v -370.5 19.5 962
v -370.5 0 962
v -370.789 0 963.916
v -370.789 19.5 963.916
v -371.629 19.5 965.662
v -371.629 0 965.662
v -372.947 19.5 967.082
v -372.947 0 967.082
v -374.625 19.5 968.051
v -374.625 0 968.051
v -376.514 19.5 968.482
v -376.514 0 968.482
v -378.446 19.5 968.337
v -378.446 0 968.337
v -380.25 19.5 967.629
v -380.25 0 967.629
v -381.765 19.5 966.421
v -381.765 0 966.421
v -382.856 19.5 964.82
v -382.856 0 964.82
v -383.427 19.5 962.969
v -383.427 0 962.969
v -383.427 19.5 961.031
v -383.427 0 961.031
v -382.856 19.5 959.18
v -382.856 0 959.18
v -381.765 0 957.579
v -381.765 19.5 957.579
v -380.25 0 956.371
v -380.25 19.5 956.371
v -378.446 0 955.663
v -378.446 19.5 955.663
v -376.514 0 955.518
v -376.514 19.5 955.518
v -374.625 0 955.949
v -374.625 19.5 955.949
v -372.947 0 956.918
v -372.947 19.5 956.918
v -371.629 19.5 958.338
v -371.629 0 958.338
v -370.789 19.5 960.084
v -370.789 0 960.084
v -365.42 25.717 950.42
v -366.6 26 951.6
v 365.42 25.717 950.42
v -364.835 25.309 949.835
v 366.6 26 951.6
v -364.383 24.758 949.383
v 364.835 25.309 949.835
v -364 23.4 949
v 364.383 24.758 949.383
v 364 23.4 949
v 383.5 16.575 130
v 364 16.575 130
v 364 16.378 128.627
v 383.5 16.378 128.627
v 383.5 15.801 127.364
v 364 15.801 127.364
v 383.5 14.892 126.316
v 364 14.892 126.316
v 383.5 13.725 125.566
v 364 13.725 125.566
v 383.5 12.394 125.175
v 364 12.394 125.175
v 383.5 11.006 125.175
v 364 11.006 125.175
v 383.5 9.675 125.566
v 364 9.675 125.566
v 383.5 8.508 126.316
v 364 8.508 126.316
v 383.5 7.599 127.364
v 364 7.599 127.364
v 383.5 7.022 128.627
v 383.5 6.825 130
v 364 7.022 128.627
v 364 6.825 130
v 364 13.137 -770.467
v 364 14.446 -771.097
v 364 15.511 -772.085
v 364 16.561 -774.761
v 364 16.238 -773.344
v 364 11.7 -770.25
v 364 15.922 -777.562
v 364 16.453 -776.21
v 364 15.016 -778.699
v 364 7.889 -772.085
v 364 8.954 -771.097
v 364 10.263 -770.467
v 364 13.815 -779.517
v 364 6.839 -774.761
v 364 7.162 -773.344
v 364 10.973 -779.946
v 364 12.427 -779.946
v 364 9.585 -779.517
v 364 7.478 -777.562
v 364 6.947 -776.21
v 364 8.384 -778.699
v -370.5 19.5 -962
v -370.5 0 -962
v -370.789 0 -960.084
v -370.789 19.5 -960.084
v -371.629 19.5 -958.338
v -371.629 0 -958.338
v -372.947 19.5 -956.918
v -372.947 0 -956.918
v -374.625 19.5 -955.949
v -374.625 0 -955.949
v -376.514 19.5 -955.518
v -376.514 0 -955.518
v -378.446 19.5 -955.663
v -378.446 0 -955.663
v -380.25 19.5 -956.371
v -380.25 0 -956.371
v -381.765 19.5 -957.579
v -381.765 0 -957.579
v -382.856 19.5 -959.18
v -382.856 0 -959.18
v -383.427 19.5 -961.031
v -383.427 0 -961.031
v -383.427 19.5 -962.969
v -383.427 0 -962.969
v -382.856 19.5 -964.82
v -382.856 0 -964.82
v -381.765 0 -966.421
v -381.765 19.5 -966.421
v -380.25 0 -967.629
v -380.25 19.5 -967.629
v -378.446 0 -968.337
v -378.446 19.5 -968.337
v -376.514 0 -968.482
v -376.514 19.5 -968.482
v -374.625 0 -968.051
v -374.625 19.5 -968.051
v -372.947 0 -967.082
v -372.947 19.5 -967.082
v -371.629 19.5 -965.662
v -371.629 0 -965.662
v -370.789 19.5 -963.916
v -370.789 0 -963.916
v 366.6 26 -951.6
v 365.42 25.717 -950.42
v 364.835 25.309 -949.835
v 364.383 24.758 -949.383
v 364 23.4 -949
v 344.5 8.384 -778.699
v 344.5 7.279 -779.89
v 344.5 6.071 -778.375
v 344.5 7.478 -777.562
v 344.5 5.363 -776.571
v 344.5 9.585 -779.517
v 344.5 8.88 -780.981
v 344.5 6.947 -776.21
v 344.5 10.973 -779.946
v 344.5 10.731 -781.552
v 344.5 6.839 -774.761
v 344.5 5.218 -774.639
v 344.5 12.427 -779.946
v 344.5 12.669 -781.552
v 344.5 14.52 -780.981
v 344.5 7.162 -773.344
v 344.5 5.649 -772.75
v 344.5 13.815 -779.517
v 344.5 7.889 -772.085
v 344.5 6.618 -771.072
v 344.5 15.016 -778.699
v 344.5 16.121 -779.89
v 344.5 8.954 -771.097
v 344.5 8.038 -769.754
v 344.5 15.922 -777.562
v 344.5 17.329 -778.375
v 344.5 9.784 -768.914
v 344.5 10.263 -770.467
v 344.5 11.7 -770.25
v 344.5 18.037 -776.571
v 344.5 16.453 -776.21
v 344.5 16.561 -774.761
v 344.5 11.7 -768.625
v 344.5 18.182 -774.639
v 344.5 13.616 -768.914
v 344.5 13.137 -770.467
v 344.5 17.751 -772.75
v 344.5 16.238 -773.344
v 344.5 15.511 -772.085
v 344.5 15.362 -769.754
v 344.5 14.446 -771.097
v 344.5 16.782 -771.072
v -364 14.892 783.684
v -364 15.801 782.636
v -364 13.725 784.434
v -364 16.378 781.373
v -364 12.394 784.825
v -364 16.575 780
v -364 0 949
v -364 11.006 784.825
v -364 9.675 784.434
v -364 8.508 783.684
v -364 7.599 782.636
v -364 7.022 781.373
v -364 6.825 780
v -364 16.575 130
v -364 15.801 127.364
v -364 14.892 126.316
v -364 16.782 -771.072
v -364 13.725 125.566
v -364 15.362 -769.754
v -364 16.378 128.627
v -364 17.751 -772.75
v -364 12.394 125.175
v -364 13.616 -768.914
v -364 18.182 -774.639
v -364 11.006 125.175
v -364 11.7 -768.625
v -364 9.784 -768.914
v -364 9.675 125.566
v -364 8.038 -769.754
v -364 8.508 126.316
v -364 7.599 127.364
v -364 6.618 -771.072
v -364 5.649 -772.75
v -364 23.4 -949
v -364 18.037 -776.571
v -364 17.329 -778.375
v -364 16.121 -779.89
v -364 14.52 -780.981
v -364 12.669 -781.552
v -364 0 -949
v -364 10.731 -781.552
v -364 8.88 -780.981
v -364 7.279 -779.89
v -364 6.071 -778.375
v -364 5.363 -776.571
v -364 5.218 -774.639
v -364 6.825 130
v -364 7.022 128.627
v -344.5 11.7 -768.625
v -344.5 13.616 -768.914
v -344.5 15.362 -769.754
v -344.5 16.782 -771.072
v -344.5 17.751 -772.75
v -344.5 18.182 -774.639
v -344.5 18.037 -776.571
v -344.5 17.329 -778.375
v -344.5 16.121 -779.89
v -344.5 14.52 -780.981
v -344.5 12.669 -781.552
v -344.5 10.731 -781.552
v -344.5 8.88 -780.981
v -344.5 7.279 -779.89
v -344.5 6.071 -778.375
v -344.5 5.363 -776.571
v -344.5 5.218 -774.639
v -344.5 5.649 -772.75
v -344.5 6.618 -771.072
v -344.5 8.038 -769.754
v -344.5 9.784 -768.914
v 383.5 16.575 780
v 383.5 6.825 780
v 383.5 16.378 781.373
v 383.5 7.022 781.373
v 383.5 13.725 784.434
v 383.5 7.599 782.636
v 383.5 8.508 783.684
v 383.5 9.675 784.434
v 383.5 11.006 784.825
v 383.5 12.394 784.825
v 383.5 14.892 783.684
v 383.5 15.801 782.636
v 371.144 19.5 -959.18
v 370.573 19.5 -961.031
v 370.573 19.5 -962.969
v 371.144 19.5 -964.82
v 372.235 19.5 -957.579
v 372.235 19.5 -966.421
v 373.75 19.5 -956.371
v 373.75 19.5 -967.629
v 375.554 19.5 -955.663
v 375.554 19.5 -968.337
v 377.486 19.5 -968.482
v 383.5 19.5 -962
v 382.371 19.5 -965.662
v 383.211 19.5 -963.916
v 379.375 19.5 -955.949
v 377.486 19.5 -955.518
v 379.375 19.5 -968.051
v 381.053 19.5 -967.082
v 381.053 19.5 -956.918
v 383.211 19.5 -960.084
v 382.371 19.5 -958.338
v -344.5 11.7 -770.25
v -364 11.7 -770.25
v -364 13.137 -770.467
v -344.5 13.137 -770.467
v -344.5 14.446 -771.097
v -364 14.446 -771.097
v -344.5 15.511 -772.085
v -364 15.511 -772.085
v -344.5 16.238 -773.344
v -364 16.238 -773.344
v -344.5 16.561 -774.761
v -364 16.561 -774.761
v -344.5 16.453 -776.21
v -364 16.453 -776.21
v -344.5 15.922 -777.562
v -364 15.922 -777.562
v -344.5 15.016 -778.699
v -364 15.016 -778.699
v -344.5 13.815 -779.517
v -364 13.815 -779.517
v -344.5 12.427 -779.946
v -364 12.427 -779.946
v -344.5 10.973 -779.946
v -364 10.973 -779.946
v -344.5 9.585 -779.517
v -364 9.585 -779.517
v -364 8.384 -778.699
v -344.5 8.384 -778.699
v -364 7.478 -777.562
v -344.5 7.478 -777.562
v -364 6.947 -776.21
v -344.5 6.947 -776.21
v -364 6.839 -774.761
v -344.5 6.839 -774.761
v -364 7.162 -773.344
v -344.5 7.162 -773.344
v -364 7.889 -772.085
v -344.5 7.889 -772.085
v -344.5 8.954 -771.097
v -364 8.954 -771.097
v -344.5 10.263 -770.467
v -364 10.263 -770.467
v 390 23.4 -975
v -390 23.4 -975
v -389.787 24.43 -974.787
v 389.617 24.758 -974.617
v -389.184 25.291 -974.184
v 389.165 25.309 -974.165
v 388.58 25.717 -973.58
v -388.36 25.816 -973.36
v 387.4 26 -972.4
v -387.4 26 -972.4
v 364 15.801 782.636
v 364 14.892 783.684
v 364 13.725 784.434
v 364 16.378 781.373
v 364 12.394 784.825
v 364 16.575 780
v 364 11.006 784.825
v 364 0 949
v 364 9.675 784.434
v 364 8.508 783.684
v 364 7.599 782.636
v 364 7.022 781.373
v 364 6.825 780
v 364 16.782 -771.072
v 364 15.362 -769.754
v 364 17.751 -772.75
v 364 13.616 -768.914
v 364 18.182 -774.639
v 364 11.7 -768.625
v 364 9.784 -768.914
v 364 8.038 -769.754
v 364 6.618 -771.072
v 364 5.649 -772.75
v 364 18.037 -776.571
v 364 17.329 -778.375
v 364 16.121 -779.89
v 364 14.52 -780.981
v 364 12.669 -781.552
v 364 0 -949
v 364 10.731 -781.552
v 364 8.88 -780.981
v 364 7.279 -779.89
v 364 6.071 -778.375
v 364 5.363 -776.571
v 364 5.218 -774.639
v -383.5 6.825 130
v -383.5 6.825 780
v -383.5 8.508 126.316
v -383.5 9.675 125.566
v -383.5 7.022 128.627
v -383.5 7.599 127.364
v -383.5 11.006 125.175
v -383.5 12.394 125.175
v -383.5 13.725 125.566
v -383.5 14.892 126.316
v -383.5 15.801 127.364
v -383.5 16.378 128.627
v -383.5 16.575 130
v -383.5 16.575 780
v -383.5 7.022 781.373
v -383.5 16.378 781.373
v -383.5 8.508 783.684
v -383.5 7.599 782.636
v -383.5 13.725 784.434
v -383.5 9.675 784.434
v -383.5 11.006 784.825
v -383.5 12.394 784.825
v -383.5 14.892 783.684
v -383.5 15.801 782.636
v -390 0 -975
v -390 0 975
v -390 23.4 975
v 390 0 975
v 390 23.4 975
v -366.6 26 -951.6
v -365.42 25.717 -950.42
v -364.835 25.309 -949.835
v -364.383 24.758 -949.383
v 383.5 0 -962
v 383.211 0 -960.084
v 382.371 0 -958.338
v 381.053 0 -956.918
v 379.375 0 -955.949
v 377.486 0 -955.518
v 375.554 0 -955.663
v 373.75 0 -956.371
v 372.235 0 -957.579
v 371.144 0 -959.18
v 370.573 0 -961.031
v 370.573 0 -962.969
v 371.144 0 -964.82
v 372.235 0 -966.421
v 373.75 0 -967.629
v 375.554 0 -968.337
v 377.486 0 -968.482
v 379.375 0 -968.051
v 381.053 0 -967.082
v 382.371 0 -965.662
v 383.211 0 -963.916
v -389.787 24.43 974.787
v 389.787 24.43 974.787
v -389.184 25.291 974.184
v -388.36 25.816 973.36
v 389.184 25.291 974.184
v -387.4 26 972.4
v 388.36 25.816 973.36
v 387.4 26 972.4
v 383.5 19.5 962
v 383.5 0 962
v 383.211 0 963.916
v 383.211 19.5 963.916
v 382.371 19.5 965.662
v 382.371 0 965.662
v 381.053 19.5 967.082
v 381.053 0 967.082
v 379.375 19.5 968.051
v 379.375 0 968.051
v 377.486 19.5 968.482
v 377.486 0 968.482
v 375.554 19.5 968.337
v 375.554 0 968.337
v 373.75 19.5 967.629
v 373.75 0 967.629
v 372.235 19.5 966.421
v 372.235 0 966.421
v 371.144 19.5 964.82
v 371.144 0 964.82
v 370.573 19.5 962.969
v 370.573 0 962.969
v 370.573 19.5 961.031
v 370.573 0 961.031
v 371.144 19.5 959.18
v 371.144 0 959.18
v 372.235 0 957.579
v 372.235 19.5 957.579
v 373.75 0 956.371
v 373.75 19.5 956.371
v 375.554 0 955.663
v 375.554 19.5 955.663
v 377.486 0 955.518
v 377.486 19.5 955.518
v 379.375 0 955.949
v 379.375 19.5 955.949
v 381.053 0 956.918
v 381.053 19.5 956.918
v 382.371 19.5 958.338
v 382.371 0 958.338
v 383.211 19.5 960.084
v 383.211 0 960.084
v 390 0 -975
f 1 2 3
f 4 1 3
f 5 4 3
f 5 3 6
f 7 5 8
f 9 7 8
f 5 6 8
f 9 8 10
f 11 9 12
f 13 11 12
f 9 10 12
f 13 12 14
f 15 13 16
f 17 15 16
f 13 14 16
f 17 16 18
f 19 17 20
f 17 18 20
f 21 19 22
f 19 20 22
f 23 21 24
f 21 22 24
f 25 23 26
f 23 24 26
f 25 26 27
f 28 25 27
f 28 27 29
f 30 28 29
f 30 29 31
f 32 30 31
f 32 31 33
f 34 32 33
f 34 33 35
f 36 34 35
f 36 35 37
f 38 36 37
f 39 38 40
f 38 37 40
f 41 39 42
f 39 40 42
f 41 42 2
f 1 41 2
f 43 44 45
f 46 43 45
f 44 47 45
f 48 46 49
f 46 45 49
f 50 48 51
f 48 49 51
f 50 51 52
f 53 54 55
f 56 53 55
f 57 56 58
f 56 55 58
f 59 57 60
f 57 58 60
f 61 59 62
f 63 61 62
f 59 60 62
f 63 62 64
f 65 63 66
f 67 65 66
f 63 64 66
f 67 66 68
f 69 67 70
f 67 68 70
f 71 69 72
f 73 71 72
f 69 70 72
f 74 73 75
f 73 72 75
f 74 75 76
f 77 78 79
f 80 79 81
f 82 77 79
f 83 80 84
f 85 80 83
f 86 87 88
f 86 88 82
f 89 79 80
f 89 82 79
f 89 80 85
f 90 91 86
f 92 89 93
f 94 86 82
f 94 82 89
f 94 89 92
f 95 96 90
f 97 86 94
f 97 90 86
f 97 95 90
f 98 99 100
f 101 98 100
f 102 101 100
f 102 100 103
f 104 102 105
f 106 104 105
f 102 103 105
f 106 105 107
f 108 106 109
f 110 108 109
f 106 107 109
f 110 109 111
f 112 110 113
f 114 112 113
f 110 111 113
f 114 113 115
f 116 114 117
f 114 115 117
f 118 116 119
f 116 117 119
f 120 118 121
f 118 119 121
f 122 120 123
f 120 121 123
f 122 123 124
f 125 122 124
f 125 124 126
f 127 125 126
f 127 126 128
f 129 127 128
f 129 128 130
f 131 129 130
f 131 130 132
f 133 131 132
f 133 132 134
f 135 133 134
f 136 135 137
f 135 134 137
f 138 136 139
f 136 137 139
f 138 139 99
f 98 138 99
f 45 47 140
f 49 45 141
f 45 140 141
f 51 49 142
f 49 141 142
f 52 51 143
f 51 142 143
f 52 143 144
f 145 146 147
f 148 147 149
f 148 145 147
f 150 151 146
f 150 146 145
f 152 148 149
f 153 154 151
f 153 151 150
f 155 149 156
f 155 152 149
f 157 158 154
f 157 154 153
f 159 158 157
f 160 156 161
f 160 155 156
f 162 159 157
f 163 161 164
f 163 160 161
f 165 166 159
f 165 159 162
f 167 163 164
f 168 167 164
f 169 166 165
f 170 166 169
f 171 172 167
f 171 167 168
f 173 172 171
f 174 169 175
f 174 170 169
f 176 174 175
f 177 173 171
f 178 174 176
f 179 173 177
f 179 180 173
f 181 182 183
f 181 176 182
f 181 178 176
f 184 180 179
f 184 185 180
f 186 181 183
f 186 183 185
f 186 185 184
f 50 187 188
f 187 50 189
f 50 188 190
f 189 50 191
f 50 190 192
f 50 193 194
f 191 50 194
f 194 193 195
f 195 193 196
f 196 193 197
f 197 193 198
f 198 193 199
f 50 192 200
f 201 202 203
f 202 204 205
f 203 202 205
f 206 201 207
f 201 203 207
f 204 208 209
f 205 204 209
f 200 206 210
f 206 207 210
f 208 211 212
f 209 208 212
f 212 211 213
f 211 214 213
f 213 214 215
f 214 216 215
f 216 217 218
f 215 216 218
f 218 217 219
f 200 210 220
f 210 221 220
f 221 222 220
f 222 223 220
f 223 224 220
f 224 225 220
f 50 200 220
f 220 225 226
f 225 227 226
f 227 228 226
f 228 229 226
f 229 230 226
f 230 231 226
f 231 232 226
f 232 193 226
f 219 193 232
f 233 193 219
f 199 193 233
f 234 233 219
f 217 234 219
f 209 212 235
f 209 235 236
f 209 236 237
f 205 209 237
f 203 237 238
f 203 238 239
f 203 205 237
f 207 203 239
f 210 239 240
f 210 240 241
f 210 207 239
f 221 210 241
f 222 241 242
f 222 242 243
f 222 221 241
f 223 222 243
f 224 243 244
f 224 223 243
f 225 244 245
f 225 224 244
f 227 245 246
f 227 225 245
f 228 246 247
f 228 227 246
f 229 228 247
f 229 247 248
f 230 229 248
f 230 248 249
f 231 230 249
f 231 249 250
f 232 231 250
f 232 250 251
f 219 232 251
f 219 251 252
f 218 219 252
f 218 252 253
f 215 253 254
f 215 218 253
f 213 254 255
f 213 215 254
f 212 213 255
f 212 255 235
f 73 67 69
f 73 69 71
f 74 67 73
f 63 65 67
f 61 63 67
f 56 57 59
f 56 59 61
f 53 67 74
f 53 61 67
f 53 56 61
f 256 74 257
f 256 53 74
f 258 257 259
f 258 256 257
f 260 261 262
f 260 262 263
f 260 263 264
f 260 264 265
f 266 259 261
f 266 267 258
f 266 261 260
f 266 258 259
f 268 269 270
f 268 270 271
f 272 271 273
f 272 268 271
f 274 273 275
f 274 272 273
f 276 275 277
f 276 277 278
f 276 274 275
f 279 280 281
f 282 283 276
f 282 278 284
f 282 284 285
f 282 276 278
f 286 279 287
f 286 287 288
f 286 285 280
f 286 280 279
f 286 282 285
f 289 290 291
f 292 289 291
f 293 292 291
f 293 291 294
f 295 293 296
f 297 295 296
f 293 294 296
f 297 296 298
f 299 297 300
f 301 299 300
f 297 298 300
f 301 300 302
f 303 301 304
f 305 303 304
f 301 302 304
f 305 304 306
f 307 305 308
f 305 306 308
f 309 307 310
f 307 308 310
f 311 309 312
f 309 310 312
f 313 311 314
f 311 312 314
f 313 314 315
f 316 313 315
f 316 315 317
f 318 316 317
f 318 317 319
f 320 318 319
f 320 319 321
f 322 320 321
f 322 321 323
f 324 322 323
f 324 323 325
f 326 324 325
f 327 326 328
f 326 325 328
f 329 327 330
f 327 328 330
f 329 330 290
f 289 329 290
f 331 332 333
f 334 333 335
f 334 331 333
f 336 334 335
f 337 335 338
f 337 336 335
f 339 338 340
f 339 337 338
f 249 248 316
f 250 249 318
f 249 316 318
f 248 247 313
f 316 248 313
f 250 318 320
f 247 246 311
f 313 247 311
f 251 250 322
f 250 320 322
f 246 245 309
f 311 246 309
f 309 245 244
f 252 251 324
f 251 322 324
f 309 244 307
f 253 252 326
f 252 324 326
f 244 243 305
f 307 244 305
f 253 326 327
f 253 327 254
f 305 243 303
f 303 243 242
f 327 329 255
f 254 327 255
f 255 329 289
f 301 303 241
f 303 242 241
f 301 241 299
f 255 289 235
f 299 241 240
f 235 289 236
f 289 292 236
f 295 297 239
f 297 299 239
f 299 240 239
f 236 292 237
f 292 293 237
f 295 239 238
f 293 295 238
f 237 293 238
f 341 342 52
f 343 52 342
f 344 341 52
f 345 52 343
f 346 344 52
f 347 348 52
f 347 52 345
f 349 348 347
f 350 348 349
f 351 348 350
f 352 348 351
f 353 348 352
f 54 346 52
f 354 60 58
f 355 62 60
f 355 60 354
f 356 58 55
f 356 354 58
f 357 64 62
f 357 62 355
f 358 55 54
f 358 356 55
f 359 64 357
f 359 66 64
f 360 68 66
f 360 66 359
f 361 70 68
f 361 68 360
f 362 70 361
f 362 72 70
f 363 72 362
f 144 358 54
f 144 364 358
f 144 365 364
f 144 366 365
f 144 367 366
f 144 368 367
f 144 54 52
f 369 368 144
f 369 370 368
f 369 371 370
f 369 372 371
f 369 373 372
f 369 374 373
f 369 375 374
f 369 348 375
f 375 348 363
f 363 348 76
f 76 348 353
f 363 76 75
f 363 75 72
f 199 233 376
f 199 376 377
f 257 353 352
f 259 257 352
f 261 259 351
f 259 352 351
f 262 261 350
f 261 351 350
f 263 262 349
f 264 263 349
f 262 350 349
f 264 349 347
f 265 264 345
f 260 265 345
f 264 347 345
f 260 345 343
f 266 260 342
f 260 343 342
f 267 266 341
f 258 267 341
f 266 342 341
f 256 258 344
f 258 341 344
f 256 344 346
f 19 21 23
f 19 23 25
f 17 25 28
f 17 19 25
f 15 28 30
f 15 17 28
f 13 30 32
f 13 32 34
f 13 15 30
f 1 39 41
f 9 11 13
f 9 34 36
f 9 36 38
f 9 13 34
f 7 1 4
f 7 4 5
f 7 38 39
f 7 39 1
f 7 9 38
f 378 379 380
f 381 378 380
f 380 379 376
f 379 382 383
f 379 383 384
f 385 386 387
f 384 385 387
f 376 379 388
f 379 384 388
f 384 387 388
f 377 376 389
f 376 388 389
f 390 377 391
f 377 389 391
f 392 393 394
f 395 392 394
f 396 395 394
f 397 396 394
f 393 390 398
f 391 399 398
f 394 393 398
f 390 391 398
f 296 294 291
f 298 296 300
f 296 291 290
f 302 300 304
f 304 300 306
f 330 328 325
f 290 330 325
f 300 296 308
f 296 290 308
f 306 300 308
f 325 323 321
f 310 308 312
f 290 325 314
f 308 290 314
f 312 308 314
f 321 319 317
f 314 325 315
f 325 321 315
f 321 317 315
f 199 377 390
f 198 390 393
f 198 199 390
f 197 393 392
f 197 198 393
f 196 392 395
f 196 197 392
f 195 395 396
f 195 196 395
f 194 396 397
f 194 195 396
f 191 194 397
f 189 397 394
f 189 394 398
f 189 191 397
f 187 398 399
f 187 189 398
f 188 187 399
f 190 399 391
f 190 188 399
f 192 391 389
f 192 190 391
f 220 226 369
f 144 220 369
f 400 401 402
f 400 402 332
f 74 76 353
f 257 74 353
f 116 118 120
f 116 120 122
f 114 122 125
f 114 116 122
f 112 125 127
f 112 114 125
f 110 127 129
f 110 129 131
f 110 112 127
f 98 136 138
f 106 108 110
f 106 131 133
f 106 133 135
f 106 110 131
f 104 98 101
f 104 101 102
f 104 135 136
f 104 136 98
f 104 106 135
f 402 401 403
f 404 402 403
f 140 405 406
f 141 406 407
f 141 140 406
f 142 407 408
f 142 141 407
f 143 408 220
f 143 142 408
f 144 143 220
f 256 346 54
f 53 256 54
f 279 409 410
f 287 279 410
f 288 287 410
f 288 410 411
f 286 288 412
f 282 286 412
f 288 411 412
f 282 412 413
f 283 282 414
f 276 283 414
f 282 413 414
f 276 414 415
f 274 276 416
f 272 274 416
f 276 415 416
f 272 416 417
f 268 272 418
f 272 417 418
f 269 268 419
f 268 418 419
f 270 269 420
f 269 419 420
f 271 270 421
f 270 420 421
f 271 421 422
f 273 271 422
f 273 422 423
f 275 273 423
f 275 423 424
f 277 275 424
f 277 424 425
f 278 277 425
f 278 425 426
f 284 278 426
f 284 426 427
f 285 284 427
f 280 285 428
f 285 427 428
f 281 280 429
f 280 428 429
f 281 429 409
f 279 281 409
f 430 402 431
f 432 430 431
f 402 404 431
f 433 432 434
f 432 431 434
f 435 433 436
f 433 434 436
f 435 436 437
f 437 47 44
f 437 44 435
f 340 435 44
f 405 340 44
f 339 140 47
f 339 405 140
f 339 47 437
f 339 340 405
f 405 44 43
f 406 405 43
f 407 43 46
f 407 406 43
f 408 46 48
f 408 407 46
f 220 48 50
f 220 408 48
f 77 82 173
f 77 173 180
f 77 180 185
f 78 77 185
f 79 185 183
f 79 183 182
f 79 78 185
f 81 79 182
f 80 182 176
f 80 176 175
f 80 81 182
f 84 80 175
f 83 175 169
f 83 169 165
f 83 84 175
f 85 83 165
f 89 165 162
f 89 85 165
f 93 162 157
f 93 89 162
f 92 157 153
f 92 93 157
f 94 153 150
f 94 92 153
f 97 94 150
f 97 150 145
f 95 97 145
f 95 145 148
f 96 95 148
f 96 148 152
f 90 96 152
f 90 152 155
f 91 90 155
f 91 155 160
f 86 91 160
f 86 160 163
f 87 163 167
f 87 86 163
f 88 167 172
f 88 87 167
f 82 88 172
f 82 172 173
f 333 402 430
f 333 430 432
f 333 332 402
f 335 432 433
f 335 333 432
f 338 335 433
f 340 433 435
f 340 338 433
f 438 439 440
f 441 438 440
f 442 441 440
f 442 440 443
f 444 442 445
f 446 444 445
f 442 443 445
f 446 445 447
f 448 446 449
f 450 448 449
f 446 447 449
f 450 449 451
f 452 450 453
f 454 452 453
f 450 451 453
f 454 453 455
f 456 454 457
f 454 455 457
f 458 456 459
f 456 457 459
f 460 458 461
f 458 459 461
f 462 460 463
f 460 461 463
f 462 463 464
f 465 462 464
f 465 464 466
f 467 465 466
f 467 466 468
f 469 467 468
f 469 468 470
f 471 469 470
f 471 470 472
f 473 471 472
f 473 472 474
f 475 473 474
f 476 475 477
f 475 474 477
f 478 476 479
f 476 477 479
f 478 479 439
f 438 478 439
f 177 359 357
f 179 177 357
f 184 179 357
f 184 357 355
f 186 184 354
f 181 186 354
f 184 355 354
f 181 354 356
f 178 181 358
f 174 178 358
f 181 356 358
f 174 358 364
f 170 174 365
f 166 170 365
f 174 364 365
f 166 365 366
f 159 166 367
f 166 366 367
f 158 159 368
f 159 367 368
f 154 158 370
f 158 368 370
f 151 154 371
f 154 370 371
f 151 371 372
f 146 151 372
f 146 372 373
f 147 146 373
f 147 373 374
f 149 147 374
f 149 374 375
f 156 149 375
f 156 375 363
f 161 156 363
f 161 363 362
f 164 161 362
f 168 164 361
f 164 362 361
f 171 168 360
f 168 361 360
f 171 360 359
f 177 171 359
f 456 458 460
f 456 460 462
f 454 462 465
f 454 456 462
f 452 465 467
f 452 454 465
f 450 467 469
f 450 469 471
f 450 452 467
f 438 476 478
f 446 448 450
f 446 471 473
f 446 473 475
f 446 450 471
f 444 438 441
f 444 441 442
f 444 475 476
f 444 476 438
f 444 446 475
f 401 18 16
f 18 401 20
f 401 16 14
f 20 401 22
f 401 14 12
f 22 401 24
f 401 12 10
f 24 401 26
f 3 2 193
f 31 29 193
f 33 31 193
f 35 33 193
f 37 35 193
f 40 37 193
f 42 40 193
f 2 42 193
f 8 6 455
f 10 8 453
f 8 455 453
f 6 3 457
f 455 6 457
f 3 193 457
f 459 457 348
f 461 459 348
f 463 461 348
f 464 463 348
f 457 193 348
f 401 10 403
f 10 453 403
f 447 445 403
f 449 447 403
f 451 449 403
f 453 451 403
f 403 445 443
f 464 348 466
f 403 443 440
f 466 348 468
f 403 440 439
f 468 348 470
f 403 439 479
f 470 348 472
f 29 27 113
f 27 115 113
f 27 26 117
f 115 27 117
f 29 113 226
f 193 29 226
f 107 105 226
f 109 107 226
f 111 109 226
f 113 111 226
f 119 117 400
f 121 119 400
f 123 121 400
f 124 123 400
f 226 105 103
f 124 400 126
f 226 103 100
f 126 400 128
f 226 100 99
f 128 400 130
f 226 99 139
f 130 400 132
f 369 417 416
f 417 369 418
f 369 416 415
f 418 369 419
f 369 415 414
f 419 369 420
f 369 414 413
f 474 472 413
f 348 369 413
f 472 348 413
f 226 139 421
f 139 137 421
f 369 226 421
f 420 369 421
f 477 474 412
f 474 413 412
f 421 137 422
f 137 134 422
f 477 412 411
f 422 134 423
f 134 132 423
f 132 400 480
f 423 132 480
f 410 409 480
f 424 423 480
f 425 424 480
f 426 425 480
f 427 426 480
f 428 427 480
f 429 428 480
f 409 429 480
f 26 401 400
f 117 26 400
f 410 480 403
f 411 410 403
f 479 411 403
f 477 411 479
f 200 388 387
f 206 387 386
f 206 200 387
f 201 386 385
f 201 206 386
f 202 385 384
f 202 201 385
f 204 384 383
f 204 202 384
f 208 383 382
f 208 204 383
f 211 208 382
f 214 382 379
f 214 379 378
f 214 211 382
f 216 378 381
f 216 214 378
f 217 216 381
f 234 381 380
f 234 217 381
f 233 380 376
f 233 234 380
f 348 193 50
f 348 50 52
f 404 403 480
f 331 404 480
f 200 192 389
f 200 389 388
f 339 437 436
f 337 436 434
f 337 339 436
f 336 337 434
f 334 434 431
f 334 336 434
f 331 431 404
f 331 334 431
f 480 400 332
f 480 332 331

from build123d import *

# Parameters (mm, degrees)
CROQUIS1_W                 = 600
CROQUIS1_H                 = 1500
CROQUIS1_W_2               = 560
CROQUIS1_H_2               = 1460
SALIENTE_EXTRUIR1_DEPTH    = 20
CROQUIS2_R                 = 5
CORTAR_EXTRUIR1_DEPTH      = 15
REDONDEO1_R                = 2
CORTAR_EXTRUIR2_DEPTH      = 575
CORTAR_EXTRUIR2_DEPTH_BACK = 15
CROQUIS5_R                 = 5
CROQUIS5_R_2               = 3.75
SALIENTE_EXTRUIR2_DEPTH    = 15
ESCALA1_SCALE              = 1.3


with BuildPart() as part:
    # Croquis1 → Saliente-Extruir1 (new body)
    with BuildSketch(Plane(origin=(0, 0, 0), x_dir=(1, 0, 0), z_dir=(0, 1, 0))):
        Rectangle(CROQUIS1_W, CROQUIS1_H)
        Rectangle(CROQUIS1_W_2, CROQUIS1_H_2, mode=Mode.SUBTRACT)
    extrude(amount=SALIENTE_EXTRUIR1_DEPTH)

    # Croquis2 → Cortar-Extruir1 (cut)
    with BuildSketch(Plane.XZ):
        with Locations((-290, 740)):
            Circle(CROQUIS2_R)
        with Locations((290, 740)):
            Circle(CROQUIS2_R)
        with Locations((290, -740)):
            Circle(CROQUIS2_R)
        with Locations((-290, -740)):
            Circle(CROQUIS2_R)
    extrude(amount=-CORTAR_EXTRUIR1_DEPTH, mode=Mode.SUBTRACT)

    # Redondeo1
    redondeo1_edges = [part.edges().sort_by_distance(p)[0] for p in [
        (-300, 20, 0),
        (280, 20, 0),
        (0, 20, 750),
        (0, 20, -730),
        (-280, 20, 0),
        (0, 20, 730),
        (300, 20, 0),
        (0, 20, -750),
    ]]
    fillet(redondeo1_edges, radius=REDONDEO1_R)

    # Croquis4 → Cortar-Extruir2 (cut, two sides)
    with BuildSketch(Plane.ZY.offset(-280)) as cortar_extruir2_sk:
        with BuildLine():
            Line((600, 12.75), (100, 12.75))
            Line((100, 12.75), (100, 5.25))
            Line((100, 5.25), (600, 5.25))
            ThreePointArc((600, 5.25), (603.75, 9), (600, 12.75))
        make_face()
        with BuildLine():
            Line((100, 5.25), (100, 12.75))
            ThreePointArc((100, 12.75), (96.25, 9), (100, 5.25))
        make_face()
    extrude(amount=CORTAR_EXTRUIR2_DEPTH, mode=Mode.SUBTRACT)
    extrude(cortar_extruir2_sk.sketch, amount=-CORTAR_EXTRUIR2_DEPTH_BACK, mode=Mode.SUBTRACT)

    # Croquis5 → Saliente-Extruir2 (add)
    with BuildSketch(Plane.ZY.offset(-280)):
        with Locations((-596.25, 9)):
            Circle(CROQUIS5_R)
        with Locations((-596.25, 9)):
            Circle(CROQUIS5_R_2, mode=Mode.SUBTRACT)
    saliente_extruir2 = extrude(amount=SALIENTE_EXTRUIR2_DEPTH)

    # Simetría1: Saliente-Extruir2 across plane
    add(saliente_extruir2.mirror(Plane(origin=(0, 0, 0), x_dir=(0, 0, 1), z_dir=(1, 0, 0))))


with BuildPart() as part_1:
    # Escala1: scaled about (0, 0, 0)
    add(part.part.scale(ESCALA1_SCALE))


solid = part_1.part
